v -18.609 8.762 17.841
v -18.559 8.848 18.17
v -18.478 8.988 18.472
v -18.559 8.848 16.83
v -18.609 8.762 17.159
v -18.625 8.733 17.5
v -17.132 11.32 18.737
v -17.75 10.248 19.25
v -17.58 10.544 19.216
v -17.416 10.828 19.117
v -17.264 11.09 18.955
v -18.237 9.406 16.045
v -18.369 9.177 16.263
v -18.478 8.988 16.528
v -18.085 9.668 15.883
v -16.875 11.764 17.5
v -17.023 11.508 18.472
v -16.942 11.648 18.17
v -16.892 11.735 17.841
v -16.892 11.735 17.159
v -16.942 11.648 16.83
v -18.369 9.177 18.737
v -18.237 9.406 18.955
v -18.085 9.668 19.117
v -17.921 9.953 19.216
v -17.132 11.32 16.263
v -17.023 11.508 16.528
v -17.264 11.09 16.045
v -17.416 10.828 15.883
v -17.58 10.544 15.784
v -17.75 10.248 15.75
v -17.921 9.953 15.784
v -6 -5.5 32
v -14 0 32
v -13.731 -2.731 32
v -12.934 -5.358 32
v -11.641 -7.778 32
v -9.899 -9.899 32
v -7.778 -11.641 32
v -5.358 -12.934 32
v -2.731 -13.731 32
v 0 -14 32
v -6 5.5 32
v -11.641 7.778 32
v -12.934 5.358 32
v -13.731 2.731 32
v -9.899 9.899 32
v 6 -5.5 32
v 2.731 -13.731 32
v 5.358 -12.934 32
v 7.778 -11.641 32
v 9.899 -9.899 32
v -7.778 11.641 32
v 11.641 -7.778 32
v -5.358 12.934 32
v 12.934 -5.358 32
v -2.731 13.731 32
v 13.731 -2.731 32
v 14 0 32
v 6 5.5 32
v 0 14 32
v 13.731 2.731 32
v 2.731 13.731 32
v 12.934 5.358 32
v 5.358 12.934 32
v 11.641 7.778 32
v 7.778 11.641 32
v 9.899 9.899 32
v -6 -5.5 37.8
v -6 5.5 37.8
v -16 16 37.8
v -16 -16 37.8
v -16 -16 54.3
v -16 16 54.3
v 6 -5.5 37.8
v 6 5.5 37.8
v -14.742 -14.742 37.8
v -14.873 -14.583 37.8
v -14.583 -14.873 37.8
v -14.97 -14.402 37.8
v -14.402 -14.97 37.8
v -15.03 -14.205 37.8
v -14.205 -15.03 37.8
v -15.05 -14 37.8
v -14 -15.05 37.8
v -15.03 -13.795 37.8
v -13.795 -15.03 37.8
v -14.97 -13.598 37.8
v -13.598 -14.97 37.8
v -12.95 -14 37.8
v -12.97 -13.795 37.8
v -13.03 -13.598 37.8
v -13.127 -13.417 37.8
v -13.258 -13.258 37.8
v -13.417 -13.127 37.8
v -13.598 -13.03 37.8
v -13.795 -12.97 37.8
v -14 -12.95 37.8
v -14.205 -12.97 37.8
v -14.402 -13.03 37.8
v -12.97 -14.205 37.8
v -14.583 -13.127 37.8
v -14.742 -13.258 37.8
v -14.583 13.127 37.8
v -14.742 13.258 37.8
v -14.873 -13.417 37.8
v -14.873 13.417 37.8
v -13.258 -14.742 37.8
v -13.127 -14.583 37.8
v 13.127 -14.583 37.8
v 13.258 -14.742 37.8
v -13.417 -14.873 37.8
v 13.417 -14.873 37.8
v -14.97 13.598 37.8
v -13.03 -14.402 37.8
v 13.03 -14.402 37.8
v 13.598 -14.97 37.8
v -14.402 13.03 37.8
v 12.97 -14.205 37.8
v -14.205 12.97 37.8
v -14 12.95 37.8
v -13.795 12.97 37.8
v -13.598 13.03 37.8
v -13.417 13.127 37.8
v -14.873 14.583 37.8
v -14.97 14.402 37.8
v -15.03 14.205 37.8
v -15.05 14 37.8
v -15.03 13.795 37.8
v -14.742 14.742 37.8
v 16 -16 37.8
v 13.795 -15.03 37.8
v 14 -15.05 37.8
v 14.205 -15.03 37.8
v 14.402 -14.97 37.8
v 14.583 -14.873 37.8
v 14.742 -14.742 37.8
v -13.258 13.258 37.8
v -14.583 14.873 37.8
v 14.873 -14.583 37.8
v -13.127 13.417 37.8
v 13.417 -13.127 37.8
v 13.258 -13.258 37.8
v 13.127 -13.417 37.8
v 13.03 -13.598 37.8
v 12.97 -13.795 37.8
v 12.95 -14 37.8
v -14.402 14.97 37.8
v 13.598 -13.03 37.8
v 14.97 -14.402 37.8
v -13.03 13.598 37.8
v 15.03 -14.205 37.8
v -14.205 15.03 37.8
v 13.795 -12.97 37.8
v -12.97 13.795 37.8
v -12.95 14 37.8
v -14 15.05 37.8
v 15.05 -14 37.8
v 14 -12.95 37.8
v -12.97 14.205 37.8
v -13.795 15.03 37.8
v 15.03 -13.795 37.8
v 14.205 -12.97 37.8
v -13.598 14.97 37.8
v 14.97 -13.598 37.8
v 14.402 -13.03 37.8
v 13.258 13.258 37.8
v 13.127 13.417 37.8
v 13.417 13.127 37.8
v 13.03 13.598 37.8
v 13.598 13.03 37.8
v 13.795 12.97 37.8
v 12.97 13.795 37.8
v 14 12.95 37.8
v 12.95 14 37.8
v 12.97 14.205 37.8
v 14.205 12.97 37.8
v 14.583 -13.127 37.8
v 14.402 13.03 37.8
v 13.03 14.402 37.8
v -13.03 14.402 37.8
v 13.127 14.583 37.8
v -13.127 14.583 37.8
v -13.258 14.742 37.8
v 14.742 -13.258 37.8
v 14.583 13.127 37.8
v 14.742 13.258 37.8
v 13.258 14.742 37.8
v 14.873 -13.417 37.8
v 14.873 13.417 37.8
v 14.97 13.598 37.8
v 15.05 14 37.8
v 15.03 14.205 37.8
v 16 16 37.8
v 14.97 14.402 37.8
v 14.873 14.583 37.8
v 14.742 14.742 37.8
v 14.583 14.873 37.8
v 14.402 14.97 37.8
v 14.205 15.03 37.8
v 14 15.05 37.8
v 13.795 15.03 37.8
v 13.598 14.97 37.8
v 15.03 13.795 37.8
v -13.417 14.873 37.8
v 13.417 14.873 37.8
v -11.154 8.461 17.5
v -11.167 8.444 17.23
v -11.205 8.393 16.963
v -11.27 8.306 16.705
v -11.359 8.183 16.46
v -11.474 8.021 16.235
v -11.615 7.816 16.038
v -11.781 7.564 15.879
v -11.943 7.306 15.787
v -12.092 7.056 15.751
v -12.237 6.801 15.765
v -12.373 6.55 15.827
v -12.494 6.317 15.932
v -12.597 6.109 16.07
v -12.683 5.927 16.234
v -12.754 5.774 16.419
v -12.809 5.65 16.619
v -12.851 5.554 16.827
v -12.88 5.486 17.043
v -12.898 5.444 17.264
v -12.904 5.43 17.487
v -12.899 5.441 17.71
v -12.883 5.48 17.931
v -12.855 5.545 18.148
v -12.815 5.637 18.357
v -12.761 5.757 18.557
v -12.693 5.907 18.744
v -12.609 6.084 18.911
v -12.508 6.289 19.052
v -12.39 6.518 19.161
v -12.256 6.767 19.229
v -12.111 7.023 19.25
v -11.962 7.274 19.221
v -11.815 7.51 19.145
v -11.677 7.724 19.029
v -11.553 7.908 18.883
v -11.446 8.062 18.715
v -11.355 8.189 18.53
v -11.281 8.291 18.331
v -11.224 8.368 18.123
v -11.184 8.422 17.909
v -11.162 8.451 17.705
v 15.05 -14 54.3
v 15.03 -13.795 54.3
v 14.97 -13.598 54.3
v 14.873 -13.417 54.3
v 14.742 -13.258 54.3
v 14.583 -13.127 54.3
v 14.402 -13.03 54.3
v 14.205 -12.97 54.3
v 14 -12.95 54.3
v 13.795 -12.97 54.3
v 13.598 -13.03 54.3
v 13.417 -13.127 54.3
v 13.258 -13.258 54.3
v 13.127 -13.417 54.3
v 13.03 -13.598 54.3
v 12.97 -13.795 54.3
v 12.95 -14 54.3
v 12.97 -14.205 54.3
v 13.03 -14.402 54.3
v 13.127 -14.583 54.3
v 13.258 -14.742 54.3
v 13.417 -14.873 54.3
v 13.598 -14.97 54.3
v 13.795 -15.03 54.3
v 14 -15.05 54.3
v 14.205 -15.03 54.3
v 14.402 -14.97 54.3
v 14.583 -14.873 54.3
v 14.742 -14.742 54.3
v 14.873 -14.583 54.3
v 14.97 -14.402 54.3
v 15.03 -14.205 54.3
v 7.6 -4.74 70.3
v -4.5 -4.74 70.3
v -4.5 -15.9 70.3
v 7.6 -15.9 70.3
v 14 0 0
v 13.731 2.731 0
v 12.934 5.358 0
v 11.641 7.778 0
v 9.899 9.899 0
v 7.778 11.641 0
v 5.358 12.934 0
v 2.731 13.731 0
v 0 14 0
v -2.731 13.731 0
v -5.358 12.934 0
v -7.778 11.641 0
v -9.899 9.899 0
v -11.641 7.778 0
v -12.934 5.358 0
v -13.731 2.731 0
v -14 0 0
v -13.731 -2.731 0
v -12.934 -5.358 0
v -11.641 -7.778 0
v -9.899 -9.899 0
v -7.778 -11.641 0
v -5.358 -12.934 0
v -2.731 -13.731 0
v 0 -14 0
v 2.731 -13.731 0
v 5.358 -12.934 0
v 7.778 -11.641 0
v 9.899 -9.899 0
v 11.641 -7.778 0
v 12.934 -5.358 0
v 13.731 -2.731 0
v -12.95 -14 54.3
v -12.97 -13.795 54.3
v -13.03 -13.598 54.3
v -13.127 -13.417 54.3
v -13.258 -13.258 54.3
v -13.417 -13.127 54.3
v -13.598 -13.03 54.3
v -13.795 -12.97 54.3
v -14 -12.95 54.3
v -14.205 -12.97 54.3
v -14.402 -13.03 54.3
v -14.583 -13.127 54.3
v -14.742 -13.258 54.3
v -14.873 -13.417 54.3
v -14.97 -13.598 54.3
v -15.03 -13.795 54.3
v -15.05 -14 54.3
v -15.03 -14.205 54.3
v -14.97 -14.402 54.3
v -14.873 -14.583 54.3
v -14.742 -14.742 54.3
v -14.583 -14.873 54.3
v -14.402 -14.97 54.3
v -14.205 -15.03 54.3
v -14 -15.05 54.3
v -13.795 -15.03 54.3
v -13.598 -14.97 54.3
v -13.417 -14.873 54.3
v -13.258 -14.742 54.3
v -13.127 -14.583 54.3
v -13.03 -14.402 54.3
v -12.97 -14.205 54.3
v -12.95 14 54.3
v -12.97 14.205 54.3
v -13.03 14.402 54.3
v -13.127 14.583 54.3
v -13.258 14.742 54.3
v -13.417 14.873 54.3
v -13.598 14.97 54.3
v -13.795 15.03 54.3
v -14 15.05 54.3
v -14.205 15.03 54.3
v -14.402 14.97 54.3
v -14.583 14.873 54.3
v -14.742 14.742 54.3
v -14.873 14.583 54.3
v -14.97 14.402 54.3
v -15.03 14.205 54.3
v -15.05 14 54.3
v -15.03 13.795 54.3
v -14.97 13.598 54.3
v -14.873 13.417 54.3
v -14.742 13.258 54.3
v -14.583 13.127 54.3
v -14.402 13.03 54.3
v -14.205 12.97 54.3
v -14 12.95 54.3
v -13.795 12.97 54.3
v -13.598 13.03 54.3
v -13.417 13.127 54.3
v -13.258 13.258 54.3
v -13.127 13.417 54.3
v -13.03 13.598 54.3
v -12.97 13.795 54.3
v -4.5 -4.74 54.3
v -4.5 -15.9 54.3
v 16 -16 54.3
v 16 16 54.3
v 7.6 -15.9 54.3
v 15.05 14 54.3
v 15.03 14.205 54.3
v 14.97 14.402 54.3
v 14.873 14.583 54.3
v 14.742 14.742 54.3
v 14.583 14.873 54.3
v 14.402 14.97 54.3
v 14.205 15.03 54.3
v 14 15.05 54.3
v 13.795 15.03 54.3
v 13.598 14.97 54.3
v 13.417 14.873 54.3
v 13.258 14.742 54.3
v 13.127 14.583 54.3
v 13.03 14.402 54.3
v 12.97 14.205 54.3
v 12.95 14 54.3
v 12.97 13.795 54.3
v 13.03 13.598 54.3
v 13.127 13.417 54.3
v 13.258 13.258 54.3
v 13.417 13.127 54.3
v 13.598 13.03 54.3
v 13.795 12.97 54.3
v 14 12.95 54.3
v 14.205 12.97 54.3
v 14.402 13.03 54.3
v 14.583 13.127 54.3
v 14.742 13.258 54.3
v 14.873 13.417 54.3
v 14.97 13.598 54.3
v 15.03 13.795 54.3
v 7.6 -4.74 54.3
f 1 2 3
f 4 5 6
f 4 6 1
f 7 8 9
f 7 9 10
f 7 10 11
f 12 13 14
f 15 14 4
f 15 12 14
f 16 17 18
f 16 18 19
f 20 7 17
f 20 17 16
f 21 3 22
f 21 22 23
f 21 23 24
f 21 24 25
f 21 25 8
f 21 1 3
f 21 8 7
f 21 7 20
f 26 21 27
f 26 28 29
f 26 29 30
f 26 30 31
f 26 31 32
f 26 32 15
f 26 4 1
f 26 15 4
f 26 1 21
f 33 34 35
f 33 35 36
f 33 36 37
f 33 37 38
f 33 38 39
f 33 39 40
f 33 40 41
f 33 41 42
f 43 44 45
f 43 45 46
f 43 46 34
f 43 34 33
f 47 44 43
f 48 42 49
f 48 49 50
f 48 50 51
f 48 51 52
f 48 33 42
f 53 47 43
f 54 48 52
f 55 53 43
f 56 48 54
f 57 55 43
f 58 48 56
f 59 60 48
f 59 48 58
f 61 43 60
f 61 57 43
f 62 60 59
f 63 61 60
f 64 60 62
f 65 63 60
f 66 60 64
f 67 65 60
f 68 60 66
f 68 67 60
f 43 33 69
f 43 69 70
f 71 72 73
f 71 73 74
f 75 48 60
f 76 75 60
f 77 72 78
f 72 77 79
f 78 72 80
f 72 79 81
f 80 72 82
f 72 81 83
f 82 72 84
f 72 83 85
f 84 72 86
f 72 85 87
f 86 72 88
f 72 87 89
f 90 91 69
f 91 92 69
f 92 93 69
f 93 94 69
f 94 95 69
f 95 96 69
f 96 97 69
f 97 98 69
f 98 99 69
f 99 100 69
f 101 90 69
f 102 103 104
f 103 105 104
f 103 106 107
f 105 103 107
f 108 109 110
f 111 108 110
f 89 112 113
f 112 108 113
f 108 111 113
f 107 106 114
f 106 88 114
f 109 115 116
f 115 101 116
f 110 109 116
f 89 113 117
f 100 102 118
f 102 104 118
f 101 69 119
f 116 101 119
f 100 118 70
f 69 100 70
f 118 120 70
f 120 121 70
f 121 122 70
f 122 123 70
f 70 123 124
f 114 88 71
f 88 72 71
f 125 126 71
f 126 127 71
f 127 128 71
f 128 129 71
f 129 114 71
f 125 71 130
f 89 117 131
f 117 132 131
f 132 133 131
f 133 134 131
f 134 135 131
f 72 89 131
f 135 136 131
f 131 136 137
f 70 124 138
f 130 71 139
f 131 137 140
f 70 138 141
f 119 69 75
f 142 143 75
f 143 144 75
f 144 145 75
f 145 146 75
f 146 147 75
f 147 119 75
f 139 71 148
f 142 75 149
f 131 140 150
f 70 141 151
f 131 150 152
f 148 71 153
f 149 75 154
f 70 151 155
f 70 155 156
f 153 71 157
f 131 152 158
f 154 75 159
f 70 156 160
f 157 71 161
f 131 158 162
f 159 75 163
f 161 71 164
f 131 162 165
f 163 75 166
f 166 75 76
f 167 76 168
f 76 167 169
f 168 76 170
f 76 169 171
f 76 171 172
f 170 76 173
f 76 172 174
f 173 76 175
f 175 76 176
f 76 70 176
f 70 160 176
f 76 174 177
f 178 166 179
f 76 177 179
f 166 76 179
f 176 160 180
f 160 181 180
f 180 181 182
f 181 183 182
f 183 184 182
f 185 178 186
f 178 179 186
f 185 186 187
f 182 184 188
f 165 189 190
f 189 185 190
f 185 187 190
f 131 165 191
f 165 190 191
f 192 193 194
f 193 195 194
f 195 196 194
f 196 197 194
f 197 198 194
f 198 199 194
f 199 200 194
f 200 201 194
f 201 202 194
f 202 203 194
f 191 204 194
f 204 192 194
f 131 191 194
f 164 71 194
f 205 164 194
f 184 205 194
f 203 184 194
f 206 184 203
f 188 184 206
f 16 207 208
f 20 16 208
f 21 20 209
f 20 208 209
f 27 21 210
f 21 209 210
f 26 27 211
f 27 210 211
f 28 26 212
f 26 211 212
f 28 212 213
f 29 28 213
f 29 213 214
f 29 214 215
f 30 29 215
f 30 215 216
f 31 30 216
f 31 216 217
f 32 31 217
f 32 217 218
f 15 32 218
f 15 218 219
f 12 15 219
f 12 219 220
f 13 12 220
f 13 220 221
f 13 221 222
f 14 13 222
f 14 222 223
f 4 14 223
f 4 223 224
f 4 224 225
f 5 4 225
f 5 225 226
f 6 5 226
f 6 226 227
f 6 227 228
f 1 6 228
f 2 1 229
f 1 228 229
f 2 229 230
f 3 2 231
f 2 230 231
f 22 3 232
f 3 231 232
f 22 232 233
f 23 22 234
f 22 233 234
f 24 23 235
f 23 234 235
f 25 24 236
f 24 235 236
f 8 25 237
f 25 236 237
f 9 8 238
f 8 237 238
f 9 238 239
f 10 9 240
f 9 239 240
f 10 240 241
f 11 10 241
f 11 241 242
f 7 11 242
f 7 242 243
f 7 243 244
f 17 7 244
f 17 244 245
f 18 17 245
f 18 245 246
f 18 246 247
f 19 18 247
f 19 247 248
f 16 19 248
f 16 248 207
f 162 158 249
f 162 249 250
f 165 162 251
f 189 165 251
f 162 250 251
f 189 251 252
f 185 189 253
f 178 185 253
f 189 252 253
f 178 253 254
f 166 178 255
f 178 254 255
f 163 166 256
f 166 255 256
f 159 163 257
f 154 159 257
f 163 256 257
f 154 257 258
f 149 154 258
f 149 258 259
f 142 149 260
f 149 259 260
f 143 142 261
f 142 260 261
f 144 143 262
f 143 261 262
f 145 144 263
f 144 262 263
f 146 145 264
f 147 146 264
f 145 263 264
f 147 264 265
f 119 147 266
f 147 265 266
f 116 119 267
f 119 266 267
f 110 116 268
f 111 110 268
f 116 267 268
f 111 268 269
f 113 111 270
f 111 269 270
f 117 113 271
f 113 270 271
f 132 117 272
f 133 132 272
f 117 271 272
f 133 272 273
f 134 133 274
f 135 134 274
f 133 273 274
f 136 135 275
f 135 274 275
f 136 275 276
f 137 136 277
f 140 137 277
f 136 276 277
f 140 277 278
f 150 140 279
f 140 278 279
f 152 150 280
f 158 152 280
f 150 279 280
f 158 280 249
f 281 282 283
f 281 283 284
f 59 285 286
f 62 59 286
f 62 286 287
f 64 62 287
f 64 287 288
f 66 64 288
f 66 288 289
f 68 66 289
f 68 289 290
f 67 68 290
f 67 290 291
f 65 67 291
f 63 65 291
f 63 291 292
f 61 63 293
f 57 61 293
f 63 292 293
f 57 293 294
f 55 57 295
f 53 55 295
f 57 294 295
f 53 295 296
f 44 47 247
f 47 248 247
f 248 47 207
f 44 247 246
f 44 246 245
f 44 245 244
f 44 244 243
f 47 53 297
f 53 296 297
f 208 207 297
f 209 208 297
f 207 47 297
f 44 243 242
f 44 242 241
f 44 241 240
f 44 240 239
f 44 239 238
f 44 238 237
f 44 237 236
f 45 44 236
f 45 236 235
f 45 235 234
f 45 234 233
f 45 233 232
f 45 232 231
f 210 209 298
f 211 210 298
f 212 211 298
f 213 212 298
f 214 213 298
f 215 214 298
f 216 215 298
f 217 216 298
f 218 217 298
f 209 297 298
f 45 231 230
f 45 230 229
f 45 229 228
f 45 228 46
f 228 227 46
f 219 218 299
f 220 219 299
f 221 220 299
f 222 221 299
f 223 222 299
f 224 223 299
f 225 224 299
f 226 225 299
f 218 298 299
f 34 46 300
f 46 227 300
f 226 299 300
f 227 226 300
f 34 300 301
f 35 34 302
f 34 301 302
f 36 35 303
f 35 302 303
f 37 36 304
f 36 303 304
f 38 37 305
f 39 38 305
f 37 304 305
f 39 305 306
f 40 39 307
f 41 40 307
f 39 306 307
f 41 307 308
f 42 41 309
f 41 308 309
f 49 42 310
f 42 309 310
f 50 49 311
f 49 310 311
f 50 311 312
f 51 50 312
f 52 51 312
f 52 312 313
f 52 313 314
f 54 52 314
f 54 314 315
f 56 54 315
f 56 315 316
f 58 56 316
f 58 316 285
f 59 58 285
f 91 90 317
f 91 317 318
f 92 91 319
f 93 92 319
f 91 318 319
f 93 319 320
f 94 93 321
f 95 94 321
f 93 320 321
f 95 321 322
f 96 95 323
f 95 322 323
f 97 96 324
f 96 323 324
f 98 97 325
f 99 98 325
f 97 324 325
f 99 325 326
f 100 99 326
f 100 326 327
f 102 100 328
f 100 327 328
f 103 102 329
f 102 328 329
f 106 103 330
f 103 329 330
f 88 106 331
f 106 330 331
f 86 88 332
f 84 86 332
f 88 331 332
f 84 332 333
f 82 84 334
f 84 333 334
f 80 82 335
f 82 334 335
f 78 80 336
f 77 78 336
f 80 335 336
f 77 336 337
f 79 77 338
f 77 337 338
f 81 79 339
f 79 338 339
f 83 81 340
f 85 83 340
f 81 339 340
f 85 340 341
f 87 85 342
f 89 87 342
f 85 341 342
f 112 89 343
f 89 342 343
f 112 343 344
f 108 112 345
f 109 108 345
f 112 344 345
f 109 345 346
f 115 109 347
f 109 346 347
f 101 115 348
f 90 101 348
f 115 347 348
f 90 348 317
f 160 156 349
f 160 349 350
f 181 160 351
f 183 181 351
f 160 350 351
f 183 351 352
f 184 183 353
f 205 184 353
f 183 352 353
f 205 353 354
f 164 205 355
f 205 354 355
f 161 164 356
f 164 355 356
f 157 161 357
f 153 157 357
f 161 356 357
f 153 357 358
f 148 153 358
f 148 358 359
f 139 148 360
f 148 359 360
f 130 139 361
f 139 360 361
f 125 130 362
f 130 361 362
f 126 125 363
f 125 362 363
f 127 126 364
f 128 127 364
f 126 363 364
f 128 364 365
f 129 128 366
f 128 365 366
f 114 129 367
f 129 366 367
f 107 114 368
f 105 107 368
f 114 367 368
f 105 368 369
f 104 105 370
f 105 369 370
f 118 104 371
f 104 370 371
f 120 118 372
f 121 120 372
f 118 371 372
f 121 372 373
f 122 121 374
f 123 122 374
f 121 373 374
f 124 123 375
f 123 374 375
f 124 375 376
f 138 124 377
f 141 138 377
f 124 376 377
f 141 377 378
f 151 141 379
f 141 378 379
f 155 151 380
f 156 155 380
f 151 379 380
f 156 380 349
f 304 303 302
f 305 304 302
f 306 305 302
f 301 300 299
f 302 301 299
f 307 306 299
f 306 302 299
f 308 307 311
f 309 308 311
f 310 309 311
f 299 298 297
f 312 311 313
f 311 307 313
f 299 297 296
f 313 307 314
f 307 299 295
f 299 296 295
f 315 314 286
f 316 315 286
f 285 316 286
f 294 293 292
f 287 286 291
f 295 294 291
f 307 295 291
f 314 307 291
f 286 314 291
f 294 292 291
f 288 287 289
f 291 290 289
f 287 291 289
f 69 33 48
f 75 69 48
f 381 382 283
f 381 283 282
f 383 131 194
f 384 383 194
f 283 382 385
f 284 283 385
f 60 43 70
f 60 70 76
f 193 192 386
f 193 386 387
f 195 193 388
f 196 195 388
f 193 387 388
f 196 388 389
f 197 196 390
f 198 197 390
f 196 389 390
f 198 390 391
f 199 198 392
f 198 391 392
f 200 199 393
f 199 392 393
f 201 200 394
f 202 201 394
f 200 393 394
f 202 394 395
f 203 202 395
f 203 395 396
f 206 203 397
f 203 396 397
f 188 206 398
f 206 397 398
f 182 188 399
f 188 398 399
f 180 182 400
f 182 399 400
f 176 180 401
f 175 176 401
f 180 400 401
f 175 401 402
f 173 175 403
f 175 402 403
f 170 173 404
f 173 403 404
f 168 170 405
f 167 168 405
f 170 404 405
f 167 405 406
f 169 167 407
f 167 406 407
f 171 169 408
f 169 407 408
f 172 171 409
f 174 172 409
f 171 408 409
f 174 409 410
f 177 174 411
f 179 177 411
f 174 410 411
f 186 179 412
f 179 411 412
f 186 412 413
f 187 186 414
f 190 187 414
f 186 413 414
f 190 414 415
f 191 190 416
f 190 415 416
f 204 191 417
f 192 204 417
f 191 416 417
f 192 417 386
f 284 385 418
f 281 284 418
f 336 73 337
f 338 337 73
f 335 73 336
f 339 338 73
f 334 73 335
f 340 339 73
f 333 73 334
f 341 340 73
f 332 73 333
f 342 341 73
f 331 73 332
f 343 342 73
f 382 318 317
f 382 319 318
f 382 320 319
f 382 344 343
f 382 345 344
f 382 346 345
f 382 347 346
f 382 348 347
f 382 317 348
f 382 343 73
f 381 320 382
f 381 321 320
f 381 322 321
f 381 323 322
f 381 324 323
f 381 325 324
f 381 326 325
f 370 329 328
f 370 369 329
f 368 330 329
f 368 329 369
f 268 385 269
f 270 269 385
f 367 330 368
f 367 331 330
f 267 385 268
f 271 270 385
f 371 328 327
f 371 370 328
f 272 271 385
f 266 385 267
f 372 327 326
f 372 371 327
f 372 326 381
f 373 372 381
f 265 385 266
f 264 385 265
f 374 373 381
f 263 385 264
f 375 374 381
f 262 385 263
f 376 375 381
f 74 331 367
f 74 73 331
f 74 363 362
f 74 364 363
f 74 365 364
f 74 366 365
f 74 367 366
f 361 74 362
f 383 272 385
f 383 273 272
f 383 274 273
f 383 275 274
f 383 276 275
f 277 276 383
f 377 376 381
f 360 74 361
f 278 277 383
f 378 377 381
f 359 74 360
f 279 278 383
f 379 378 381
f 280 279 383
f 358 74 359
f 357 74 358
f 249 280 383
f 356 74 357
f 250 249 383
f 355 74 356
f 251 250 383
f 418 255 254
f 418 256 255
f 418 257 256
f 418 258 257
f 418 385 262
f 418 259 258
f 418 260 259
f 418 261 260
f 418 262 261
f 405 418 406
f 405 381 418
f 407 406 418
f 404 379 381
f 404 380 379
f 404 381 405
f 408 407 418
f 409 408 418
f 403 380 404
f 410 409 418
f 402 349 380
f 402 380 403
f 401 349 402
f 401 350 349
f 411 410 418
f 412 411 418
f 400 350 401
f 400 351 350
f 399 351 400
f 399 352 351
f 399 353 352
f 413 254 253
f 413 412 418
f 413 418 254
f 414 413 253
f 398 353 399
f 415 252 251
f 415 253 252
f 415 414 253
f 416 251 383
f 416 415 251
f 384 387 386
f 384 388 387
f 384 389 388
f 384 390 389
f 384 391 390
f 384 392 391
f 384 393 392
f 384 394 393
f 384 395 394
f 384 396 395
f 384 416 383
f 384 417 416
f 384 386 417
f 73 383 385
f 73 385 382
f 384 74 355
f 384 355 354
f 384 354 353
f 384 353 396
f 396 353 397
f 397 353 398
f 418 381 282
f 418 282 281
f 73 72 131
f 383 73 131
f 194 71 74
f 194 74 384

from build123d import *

# Parameters (mm, degrees)
SKETCH_1_R          = 14
EXTRUDE_1_DEPTH     = 32
SKETCH_2_W          = 12
SKETCH_2_H          = 11
EXTRUDE_2_DEPTH     = 5.8
SKETCH_3_W          = 32
SKETCH_3_H          = 32
EXTRUDE_3_DEPTH     = 16.5
SKETCH_4_W          = 12.1
SKETCH_4_H          = 11.16
EXTRUDE_4_DEPTH     = 16
SKETCH_5_R          = 1.05
CUT_EXTRUDE_1_DEPTH = 16.5
EXTRUDE_START       = -21.86
SKETCH_6_R          = 1.75
EXTRUDE_6_DEPTH     = 20.5


with BuildPart() as part:
    # 草图1 → 凸台-拉伸1 (new body)
    with BuildSketch(Plane.XY):
        Circle(SKETCH_1_R)
    extrude(amount=EXTRUDE_1_DEPTH)

    # 草图2 → 凸台-拉伸2 (add)
    with BuildSketch(Plane.XY.offset(32)):
        Rectangle(SKETCH_2_W, SKETCH_2_H)
    extrude(amount=EXTRUDE_2_DEPTH)

    # 草图3 → 凸台-拉伸3 (add)
    with BuildSketch(Plane.XY.offset(37.8)):
        Rectangle(SKETCH_3_W, SKETCH_3_H)
    extrude(amount=EXTRUDE_3_DEPTH)

    # 草图4 → 凸台-拉伸4 (add)
    with BuildSketch(Plane.XY.offset(54.3)):
        with Locations((1.55, -10.32)):
            Rectangle(SKETCH_4_W, SKETCH_4_H)
    extrude(amount=EXTRUDE_4_DEPTH)

    # 草图5 → 切除-拉伸1 (cut)
    with BuildSketch(Plane.XY.offset(54.3)):
        with Locations((-14, 14)):
            Circle(SKETCH_5_R)
        with Locations((14, 14)):
            Circle(SKETCH_5_R)
        with Locations((-14, -14)):
            Circle(SKETCH_5_R)
        with Locations((14, -14)):
            Circle(SKETCH_5_R)
    extrude(amount=-CUT_EXTRUDE_1_DEPTH, mode=Mode.SUBTRACT)

    # 草图6 → 凸台-拉伸6 (add)
    with BuildSketch(Plane(origin=(-18.92820323, 10.92820323, 0), x_dir=(0, 0, -1), z_dir=(-0.8660254037844398, 0.499999999999998, 0)).offset(EXTRUDE_START)):
        with Locations(Location((-17.5, 0, 0), (0, 0, 270))):
            Circle(SKETCH_6_R)
    extrude(amount=EXTRUDE_6_DEPTH)


solid = part.part
